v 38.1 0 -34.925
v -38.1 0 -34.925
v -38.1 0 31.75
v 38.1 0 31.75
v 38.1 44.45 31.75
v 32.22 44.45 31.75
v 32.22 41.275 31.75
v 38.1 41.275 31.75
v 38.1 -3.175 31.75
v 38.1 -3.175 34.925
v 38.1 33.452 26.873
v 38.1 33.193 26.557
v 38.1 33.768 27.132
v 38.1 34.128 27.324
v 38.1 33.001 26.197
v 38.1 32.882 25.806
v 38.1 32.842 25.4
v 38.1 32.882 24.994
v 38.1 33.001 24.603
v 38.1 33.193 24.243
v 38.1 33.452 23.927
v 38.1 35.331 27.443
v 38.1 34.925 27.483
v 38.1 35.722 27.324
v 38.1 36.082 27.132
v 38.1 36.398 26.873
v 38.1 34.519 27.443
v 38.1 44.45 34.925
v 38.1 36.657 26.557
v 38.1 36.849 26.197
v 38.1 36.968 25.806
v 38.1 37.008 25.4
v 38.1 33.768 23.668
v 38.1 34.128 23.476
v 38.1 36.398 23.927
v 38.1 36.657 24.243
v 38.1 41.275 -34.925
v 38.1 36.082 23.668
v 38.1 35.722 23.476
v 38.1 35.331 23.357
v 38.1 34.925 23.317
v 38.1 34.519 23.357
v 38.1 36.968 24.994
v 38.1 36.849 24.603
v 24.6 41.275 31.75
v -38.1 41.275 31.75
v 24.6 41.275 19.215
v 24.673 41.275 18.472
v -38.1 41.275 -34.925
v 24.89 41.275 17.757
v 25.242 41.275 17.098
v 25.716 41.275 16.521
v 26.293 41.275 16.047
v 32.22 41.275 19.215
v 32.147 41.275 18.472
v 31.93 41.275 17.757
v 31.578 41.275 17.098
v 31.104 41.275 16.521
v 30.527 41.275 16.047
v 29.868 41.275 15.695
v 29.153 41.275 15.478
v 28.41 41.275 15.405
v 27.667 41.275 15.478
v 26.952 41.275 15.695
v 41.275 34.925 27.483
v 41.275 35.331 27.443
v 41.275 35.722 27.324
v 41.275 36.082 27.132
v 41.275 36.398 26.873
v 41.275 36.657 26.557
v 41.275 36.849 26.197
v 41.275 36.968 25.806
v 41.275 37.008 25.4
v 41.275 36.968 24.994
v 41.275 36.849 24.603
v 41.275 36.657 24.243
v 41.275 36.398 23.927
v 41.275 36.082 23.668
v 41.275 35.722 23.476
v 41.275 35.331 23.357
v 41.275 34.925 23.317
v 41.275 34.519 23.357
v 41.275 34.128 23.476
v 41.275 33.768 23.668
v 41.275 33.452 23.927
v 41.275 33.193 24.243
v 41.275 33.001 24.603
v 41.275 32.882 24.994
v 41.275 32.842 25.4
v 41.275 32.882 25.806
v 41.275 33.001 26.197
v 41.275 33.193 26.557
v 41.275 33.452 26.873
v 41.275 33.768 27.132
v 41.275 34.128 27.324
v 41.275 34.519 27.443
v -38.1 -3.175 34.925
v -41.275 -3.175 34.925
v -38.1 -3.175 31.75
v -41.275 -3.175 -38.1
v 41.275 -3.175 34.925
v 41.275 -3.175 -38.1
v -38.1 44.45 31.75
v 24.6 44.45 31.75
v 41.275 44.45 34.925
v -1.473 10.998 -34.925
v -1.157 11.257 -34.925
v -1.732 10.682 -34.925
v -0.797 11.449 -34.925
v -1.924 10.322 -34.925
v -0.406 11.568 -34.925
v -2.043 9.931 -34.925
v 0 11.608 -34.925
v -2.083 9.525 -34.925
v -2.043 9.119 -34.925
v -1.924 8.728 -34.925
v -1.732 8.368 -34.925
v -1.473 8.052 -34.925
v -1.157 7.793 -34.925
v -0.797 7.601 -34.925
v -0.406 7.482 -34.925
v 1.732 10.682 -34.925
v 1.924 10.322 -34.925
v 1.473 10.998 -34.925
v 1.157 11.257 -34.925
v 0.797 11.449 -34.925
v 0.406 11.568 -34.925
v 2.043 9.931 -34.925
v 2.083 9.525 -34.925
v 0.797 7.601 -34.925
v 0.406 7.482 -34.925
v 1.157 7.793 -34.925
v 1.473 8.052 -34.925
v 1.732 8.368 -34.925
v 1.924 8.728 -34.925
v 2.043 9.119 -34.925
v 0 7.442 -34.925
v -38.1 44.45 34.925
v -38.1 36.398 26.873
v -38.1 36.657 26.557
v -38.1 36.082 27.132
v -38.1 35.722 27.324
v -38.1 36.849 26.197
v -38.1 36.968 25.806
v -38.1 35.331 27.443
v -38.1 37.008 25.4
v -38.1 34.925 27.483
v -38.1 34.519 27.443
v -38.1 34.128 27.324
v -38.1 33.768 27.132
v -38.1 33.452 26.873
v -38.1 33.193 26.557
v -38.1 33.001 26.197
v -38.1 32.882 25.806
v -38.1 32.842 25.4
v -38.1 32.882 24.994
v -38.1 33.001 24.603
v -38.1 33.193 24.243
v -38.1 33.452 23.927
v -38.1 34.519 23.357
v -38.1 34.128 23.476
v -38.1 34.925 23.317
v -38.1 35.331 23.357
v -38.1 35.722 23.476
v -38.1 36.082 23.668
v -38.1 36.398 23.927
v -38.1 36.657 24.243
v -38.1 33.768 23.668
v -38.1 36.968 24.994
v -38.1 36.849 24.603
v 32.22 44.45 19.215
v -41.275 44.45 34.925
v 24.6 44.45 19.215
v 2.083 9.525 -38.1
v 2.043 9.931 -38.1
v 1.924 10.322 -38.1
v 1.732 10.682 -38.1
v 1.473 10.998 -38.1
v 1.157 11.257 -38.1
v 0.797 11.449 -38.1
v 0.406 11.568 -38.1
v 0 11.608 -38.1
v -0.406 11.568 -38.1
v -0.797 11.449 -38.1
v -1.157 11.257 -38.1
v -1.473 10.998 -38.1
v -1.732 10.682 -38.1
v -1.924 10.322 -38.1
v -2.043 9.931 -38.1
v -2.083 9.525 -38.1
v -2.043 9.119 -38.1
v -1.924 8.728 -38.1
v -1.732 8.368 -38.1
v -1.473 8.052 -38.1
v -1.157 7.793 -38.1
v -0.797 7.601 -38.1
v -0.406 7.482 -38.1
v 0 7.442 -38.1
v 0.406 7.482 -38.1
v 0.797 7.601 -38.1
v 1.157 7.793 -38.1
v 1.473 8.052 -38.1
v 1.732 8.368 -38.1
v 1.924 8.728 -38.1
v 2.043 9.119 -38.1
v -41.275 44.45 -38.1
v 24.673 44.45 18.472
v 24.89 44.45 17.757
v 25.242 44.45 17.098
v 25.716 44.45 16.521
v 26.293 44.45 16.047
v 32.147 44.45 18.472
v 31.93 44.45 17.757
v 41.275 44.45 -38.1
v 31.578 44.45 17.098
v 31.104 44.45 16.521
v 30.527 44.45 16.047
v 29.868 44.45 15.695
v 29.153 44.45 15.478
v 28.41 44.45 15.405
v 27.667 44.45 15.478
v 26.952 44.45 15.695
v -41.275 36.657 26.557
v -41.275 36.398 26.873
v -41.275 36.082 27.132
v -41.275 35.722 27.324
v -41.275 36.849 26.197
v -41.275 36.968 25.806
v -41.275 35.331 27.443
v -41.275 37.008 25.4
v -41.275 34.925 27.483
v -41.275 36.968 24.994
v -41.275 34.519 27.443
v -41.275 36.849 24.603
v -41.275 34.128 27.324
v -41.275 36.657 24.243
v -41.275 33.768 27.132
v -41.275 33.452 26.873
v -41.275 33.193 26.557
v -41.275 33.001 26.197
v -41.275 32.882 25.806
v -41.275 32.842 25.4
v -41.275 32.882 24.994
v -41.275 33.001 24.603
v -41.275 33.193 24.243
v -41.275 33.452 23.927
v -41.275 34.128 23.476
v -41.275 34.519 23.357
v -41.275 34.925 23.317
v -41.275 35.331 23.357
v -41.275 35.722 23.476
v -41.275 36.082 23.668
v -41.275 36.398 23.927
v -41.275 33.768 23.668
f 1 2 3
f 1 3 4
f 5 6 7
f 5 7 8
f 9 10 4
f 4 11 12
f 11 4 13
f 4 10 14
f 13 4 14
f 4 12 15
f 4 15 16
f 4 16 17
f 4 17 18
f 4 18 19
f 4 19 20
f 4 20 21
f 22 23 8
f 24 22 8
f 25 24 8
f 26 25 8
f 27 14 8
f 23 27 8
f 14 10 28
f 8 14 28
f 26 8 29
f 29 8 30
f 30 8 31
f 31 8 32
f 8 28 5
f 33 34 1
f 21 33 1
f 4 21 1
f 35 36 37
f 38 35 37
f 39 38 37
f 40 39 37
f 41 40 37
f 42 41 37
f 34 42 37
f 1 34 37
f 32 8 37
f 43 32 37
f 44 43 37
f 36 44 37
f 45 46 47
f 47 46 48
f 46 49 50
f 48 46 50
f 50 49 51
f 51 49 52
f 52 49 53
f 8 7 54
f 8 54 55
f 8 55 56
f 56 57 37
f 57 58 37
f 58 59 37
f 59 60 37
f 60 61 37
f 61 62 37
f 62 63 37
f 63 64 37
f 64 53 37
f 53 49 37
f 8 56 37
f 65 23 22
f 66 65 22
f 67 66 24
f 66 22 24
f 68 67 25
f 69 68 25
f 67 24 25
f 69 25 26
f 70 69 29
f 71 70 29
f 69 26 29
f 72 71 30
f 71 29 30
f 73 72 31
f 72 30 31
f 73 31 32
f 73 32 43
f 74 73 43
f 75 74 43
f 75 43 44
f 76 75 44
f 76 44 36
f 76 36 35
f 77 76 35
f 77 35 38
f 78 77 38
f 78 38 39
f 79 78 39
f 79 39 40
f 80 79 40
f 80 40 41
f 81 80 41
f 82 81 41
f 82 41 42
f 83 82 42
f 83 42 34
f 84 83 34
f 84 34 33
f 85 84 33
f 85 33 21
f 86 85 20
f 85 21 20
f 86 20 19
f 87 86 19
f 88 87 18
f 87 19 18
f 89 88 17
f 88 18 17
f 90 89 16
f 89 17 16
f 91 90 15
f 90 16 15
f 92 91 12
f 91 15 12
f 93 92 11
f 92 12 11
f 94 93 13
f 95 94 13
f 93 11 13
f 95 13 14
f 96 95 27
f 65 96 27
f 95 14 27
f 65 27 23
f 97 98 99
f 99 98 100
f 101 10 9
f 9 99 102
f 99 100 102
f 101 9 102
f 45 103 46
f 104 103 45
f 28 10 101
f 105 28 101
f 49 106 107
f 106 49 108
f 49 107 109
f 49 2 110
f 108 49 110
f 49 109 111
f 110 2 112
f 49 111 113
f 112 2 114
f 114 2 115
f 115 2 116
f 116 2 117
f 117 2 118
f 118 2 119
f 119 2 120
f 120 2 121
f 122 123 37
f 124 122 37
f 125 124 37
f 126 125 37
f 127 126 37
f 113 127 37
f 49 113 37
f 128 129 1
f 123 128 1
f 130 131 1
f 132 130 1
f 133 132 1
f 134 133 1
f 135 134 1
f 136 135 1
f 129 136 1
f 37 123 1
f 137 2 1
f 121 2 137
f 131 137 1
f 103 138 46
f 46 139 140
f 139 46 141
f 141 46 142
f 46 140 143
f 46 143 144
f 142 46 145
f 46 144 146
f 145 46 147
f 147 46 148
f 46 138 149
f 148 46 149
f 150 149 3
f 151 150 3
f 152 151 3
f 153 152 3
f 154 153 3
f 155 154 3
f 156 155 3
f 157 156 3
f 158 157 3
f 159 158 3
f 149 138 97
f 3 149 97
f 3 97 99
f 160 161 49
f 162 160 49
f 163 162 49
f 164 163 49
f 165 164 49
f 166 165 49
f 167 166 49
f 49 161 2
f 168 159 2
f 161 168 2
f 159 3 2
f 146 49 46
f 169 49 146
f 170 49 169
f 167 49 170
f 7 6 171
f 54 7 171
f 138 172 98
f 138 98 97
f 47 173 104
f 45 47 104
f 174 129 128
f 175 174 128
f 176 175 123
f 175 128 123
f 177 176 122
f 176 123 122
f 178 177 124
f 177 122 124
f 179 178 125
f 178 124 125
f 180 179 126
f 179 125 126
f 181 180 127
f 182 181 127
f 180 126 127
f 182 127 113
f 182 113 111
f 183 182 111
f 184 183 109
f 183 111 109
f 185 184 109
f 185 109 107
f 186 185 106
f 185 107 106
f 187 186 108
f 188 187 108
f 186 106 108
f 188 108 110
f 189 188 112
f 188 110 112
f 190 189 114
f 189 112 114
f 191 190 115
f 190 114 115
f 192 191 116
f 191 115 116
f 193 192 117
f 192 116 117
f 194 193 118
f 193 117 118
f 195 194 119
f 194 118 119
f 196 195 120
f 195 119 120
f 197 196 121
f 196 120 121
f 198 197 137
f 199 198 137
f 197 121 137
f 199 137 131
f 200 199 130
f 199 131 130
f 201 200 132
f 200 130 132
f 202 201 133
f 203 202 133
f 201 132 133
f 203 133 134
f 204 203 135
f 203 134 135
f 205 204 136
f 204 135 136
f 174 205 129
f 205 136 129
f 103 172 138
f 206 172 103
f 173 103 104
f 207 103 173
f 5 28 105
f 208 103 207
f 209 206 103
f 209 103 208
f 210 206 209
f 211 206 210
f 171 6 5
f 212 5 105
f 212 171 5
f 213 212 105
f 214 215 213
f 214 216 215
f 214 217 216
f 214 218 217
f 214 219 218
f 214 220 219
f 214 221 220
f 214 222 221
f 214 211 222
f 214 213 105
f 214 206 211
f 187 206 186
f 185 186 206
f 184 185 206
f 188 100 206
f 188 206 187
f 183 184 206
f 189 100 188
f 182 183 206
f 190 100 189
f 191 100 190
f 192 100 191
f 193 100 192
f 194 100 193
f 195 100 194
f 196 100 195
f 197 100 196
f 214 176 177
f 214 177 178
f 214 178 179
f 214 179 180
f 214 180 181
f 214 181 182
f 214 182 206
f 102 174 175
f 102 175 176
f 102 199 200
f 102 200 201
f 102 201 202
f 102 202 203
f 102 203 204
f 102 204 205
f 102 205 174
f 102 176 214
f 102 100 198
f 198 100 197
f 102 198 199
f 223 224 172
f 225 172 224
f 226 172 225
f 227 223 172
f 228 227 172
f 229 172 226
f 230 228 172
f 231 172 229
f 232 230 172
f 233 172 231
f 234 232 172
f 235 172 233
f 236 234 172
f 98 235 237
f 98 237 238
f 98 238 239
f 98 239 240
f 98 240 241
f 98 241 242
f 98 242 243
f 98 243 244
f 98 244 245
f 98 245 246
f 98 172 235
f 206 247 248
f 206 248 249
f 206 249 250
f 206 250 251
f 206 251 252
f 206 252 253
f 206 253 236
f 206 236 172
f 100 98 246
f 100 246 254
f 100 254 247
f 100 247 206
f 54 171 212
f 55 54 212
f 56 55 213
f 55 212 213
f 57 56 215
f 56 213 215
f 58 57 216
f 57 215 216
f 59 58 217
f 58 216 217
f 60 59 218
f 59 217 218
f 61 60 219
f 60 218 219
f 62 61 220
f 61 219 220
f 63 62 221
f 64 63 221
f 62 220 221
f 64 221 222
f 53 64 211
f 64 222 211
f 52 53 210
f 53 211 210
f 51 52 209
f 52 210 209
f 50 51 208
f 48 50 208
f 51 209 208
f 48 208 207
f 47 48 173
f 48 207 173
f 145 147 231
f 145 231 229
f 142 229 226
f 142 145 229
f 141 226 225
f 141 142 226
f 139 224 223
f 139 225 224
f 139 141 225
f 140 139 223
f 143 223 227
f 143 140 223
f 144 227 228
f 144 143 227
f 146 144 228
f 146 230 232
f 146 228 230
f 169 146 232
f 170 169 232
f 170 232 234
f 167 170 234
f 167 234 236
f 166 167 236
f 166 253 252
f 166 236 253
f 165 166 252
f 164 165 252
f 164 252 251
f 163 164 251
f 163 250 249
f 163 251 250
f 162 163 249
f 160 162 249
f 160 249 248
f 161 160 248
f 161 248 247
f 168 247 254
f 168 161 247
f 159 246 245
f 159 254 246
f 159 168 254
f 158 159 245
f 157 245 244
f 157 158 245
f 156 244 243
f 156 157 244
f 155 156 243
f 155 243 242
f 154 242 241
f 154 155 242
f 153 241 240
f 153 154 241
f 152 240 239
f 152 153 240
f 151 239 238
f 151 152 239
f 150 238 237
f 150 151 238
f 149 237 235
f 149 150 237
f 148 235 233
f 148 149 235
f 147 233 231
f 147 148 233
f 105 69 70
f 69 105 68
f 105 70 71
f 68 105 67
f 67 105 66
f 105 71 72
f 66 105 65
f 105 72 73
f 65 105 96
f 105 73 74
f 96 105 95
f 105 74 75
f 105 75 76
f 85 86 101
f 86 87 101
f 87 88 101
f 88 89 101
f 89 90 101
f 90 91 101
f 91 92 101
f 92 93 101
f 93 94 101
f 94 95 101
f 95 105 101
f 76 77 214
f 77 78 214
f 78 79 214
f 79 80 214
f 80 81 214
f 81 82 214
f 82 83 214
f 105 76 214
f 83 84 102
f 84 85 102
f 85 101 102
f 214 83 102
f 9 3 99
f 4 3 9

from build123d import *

# Parameters (mm, degrees)
SKETCH1_W               = 76.2
SKETCH1_H               = 69.85
BOSS_EXTRUDE1_DEPTH     = 41.275
SHELL2_T                = 3.175
SKETCH2_W               = 76.2
SKETCH2_H               = 3.175
CUT_EXTRUDE1_DEPTH      = 74.643575755
CUT_EXTRUDE1_DEPTH_BACK = 74.643575755
CUT_EXTRUDE2_REACH      = 75.644
SKETCH4_R               = 2.0828
CUT_EXTRUDE3_DEPTH      = 3.175
SKETCH5_R               = 2.0828
CUT_EXTRUDE4_DEPTH      = 99.629626001
CUT_EXTRUDE4_DEPTH_BACK = 99.629626001


with BuildPart() as part:
    # Sketch1 → Boss-Extrude1 (new body)
    with BuildSketch(Plane(origin=(0, 0, 0), x_dir=(1, 0, 0), z_dir=(0, 1, 0))):
        Rectangle(SKETCH1_W, SKETCH1_H)
    extrude(amount=BOSS_EXTRUDE1_DEPTH)

    # Shell2
    shell2_openings = [part.faces().sort_by_distance(p)[0] for p in [
        (0, 20.6375, 34.925),
    ]]
    offset(amount=SHELL2_T, openings=shell2_openings, kind=Kind.INTERSECTION)

    # Sketch2 → Cut-Extrude1 (cut, two sides)
    with BuildSketch(Plane(origin=(0, 44.45, 0), x_dir=(1, 0, 0), z_dir=(0, 1, 0))) as cut_extrude1_sk:
        with Locations((0, -33.3375)):
            Rectangle(SKETCH2_W, SKETCH2_H)
    extrude(amount=CUT_EXTRUDE1_DEPTH, mode=Mode.SUBTRACT)
    extrude(cut_extrude1_sk.sketch, amount=-CUT_EXTRUDE1_DEPTH_BACK, mode=Mode.SUBTRACT)

    # Sketch3 → Cut-Extrude2 (cut, up to next)
    with BuildSketch(Plane(origin=(0, 44.45, 0), x_dir=(1, 0, 0), z_dir=(0, 1, 0)), mode=Mode.PRIVATE) as cut_extrude2_sk1:
        with BuildLine():
            Line((24.5999, -19.2151), (24.5999, -31.75))
            Line((24.5999, -31.75), (32.2199, -31.75))
            Line((32.2199, -31.75), (32.2199, -19.2151))
            ThreePointArc((32.2199, -19.2151), (28.4099, -15.4051), (24.5999, -19.2151))
        make_face()
    cut_extrude2_tool1 = extrude(cut_extrude2_sk1.sketch, amount=-CUT_EXTRUDE2_REACH, mode=Mode.PRIVATE) & part.part
    add(cut_extrude2_tool1.solids().sort_by_distance((28.4099, 44.45, 23.96308))[0], mode=Mode.SUBTRACT)

    # Sketch4 → Cut-Extrude3 (cut)
    with BuildSketch(Plane.XY.offset(-34.925)):
        with Locations((0, 9.525)):
            Circle(SKETCH4_R)
    extrude(amount=-CUT_EXTRUDE3_DEPTH, mode=Mode.SUBTRACT)

    # Sketch5 → Cut-Extrude4 (cut, two sides)
    with BuildSketch(Plane.ZY.offset(-38.1)) as cut_extrude4_sk:
        with Locations((25.4, 34.925)):
            Circle(SKETCH5_R)
    extrude(amount=CUT_EXTRUDE4_DEPTH, mode=Mode.SUBTRACT)
    extrude(cut_extrude4_sk.sketch, amount=-CUT_EXTRUDE4_DEPTH_BACK, mode=Mode.SUBTRACT)


solid = part.part
